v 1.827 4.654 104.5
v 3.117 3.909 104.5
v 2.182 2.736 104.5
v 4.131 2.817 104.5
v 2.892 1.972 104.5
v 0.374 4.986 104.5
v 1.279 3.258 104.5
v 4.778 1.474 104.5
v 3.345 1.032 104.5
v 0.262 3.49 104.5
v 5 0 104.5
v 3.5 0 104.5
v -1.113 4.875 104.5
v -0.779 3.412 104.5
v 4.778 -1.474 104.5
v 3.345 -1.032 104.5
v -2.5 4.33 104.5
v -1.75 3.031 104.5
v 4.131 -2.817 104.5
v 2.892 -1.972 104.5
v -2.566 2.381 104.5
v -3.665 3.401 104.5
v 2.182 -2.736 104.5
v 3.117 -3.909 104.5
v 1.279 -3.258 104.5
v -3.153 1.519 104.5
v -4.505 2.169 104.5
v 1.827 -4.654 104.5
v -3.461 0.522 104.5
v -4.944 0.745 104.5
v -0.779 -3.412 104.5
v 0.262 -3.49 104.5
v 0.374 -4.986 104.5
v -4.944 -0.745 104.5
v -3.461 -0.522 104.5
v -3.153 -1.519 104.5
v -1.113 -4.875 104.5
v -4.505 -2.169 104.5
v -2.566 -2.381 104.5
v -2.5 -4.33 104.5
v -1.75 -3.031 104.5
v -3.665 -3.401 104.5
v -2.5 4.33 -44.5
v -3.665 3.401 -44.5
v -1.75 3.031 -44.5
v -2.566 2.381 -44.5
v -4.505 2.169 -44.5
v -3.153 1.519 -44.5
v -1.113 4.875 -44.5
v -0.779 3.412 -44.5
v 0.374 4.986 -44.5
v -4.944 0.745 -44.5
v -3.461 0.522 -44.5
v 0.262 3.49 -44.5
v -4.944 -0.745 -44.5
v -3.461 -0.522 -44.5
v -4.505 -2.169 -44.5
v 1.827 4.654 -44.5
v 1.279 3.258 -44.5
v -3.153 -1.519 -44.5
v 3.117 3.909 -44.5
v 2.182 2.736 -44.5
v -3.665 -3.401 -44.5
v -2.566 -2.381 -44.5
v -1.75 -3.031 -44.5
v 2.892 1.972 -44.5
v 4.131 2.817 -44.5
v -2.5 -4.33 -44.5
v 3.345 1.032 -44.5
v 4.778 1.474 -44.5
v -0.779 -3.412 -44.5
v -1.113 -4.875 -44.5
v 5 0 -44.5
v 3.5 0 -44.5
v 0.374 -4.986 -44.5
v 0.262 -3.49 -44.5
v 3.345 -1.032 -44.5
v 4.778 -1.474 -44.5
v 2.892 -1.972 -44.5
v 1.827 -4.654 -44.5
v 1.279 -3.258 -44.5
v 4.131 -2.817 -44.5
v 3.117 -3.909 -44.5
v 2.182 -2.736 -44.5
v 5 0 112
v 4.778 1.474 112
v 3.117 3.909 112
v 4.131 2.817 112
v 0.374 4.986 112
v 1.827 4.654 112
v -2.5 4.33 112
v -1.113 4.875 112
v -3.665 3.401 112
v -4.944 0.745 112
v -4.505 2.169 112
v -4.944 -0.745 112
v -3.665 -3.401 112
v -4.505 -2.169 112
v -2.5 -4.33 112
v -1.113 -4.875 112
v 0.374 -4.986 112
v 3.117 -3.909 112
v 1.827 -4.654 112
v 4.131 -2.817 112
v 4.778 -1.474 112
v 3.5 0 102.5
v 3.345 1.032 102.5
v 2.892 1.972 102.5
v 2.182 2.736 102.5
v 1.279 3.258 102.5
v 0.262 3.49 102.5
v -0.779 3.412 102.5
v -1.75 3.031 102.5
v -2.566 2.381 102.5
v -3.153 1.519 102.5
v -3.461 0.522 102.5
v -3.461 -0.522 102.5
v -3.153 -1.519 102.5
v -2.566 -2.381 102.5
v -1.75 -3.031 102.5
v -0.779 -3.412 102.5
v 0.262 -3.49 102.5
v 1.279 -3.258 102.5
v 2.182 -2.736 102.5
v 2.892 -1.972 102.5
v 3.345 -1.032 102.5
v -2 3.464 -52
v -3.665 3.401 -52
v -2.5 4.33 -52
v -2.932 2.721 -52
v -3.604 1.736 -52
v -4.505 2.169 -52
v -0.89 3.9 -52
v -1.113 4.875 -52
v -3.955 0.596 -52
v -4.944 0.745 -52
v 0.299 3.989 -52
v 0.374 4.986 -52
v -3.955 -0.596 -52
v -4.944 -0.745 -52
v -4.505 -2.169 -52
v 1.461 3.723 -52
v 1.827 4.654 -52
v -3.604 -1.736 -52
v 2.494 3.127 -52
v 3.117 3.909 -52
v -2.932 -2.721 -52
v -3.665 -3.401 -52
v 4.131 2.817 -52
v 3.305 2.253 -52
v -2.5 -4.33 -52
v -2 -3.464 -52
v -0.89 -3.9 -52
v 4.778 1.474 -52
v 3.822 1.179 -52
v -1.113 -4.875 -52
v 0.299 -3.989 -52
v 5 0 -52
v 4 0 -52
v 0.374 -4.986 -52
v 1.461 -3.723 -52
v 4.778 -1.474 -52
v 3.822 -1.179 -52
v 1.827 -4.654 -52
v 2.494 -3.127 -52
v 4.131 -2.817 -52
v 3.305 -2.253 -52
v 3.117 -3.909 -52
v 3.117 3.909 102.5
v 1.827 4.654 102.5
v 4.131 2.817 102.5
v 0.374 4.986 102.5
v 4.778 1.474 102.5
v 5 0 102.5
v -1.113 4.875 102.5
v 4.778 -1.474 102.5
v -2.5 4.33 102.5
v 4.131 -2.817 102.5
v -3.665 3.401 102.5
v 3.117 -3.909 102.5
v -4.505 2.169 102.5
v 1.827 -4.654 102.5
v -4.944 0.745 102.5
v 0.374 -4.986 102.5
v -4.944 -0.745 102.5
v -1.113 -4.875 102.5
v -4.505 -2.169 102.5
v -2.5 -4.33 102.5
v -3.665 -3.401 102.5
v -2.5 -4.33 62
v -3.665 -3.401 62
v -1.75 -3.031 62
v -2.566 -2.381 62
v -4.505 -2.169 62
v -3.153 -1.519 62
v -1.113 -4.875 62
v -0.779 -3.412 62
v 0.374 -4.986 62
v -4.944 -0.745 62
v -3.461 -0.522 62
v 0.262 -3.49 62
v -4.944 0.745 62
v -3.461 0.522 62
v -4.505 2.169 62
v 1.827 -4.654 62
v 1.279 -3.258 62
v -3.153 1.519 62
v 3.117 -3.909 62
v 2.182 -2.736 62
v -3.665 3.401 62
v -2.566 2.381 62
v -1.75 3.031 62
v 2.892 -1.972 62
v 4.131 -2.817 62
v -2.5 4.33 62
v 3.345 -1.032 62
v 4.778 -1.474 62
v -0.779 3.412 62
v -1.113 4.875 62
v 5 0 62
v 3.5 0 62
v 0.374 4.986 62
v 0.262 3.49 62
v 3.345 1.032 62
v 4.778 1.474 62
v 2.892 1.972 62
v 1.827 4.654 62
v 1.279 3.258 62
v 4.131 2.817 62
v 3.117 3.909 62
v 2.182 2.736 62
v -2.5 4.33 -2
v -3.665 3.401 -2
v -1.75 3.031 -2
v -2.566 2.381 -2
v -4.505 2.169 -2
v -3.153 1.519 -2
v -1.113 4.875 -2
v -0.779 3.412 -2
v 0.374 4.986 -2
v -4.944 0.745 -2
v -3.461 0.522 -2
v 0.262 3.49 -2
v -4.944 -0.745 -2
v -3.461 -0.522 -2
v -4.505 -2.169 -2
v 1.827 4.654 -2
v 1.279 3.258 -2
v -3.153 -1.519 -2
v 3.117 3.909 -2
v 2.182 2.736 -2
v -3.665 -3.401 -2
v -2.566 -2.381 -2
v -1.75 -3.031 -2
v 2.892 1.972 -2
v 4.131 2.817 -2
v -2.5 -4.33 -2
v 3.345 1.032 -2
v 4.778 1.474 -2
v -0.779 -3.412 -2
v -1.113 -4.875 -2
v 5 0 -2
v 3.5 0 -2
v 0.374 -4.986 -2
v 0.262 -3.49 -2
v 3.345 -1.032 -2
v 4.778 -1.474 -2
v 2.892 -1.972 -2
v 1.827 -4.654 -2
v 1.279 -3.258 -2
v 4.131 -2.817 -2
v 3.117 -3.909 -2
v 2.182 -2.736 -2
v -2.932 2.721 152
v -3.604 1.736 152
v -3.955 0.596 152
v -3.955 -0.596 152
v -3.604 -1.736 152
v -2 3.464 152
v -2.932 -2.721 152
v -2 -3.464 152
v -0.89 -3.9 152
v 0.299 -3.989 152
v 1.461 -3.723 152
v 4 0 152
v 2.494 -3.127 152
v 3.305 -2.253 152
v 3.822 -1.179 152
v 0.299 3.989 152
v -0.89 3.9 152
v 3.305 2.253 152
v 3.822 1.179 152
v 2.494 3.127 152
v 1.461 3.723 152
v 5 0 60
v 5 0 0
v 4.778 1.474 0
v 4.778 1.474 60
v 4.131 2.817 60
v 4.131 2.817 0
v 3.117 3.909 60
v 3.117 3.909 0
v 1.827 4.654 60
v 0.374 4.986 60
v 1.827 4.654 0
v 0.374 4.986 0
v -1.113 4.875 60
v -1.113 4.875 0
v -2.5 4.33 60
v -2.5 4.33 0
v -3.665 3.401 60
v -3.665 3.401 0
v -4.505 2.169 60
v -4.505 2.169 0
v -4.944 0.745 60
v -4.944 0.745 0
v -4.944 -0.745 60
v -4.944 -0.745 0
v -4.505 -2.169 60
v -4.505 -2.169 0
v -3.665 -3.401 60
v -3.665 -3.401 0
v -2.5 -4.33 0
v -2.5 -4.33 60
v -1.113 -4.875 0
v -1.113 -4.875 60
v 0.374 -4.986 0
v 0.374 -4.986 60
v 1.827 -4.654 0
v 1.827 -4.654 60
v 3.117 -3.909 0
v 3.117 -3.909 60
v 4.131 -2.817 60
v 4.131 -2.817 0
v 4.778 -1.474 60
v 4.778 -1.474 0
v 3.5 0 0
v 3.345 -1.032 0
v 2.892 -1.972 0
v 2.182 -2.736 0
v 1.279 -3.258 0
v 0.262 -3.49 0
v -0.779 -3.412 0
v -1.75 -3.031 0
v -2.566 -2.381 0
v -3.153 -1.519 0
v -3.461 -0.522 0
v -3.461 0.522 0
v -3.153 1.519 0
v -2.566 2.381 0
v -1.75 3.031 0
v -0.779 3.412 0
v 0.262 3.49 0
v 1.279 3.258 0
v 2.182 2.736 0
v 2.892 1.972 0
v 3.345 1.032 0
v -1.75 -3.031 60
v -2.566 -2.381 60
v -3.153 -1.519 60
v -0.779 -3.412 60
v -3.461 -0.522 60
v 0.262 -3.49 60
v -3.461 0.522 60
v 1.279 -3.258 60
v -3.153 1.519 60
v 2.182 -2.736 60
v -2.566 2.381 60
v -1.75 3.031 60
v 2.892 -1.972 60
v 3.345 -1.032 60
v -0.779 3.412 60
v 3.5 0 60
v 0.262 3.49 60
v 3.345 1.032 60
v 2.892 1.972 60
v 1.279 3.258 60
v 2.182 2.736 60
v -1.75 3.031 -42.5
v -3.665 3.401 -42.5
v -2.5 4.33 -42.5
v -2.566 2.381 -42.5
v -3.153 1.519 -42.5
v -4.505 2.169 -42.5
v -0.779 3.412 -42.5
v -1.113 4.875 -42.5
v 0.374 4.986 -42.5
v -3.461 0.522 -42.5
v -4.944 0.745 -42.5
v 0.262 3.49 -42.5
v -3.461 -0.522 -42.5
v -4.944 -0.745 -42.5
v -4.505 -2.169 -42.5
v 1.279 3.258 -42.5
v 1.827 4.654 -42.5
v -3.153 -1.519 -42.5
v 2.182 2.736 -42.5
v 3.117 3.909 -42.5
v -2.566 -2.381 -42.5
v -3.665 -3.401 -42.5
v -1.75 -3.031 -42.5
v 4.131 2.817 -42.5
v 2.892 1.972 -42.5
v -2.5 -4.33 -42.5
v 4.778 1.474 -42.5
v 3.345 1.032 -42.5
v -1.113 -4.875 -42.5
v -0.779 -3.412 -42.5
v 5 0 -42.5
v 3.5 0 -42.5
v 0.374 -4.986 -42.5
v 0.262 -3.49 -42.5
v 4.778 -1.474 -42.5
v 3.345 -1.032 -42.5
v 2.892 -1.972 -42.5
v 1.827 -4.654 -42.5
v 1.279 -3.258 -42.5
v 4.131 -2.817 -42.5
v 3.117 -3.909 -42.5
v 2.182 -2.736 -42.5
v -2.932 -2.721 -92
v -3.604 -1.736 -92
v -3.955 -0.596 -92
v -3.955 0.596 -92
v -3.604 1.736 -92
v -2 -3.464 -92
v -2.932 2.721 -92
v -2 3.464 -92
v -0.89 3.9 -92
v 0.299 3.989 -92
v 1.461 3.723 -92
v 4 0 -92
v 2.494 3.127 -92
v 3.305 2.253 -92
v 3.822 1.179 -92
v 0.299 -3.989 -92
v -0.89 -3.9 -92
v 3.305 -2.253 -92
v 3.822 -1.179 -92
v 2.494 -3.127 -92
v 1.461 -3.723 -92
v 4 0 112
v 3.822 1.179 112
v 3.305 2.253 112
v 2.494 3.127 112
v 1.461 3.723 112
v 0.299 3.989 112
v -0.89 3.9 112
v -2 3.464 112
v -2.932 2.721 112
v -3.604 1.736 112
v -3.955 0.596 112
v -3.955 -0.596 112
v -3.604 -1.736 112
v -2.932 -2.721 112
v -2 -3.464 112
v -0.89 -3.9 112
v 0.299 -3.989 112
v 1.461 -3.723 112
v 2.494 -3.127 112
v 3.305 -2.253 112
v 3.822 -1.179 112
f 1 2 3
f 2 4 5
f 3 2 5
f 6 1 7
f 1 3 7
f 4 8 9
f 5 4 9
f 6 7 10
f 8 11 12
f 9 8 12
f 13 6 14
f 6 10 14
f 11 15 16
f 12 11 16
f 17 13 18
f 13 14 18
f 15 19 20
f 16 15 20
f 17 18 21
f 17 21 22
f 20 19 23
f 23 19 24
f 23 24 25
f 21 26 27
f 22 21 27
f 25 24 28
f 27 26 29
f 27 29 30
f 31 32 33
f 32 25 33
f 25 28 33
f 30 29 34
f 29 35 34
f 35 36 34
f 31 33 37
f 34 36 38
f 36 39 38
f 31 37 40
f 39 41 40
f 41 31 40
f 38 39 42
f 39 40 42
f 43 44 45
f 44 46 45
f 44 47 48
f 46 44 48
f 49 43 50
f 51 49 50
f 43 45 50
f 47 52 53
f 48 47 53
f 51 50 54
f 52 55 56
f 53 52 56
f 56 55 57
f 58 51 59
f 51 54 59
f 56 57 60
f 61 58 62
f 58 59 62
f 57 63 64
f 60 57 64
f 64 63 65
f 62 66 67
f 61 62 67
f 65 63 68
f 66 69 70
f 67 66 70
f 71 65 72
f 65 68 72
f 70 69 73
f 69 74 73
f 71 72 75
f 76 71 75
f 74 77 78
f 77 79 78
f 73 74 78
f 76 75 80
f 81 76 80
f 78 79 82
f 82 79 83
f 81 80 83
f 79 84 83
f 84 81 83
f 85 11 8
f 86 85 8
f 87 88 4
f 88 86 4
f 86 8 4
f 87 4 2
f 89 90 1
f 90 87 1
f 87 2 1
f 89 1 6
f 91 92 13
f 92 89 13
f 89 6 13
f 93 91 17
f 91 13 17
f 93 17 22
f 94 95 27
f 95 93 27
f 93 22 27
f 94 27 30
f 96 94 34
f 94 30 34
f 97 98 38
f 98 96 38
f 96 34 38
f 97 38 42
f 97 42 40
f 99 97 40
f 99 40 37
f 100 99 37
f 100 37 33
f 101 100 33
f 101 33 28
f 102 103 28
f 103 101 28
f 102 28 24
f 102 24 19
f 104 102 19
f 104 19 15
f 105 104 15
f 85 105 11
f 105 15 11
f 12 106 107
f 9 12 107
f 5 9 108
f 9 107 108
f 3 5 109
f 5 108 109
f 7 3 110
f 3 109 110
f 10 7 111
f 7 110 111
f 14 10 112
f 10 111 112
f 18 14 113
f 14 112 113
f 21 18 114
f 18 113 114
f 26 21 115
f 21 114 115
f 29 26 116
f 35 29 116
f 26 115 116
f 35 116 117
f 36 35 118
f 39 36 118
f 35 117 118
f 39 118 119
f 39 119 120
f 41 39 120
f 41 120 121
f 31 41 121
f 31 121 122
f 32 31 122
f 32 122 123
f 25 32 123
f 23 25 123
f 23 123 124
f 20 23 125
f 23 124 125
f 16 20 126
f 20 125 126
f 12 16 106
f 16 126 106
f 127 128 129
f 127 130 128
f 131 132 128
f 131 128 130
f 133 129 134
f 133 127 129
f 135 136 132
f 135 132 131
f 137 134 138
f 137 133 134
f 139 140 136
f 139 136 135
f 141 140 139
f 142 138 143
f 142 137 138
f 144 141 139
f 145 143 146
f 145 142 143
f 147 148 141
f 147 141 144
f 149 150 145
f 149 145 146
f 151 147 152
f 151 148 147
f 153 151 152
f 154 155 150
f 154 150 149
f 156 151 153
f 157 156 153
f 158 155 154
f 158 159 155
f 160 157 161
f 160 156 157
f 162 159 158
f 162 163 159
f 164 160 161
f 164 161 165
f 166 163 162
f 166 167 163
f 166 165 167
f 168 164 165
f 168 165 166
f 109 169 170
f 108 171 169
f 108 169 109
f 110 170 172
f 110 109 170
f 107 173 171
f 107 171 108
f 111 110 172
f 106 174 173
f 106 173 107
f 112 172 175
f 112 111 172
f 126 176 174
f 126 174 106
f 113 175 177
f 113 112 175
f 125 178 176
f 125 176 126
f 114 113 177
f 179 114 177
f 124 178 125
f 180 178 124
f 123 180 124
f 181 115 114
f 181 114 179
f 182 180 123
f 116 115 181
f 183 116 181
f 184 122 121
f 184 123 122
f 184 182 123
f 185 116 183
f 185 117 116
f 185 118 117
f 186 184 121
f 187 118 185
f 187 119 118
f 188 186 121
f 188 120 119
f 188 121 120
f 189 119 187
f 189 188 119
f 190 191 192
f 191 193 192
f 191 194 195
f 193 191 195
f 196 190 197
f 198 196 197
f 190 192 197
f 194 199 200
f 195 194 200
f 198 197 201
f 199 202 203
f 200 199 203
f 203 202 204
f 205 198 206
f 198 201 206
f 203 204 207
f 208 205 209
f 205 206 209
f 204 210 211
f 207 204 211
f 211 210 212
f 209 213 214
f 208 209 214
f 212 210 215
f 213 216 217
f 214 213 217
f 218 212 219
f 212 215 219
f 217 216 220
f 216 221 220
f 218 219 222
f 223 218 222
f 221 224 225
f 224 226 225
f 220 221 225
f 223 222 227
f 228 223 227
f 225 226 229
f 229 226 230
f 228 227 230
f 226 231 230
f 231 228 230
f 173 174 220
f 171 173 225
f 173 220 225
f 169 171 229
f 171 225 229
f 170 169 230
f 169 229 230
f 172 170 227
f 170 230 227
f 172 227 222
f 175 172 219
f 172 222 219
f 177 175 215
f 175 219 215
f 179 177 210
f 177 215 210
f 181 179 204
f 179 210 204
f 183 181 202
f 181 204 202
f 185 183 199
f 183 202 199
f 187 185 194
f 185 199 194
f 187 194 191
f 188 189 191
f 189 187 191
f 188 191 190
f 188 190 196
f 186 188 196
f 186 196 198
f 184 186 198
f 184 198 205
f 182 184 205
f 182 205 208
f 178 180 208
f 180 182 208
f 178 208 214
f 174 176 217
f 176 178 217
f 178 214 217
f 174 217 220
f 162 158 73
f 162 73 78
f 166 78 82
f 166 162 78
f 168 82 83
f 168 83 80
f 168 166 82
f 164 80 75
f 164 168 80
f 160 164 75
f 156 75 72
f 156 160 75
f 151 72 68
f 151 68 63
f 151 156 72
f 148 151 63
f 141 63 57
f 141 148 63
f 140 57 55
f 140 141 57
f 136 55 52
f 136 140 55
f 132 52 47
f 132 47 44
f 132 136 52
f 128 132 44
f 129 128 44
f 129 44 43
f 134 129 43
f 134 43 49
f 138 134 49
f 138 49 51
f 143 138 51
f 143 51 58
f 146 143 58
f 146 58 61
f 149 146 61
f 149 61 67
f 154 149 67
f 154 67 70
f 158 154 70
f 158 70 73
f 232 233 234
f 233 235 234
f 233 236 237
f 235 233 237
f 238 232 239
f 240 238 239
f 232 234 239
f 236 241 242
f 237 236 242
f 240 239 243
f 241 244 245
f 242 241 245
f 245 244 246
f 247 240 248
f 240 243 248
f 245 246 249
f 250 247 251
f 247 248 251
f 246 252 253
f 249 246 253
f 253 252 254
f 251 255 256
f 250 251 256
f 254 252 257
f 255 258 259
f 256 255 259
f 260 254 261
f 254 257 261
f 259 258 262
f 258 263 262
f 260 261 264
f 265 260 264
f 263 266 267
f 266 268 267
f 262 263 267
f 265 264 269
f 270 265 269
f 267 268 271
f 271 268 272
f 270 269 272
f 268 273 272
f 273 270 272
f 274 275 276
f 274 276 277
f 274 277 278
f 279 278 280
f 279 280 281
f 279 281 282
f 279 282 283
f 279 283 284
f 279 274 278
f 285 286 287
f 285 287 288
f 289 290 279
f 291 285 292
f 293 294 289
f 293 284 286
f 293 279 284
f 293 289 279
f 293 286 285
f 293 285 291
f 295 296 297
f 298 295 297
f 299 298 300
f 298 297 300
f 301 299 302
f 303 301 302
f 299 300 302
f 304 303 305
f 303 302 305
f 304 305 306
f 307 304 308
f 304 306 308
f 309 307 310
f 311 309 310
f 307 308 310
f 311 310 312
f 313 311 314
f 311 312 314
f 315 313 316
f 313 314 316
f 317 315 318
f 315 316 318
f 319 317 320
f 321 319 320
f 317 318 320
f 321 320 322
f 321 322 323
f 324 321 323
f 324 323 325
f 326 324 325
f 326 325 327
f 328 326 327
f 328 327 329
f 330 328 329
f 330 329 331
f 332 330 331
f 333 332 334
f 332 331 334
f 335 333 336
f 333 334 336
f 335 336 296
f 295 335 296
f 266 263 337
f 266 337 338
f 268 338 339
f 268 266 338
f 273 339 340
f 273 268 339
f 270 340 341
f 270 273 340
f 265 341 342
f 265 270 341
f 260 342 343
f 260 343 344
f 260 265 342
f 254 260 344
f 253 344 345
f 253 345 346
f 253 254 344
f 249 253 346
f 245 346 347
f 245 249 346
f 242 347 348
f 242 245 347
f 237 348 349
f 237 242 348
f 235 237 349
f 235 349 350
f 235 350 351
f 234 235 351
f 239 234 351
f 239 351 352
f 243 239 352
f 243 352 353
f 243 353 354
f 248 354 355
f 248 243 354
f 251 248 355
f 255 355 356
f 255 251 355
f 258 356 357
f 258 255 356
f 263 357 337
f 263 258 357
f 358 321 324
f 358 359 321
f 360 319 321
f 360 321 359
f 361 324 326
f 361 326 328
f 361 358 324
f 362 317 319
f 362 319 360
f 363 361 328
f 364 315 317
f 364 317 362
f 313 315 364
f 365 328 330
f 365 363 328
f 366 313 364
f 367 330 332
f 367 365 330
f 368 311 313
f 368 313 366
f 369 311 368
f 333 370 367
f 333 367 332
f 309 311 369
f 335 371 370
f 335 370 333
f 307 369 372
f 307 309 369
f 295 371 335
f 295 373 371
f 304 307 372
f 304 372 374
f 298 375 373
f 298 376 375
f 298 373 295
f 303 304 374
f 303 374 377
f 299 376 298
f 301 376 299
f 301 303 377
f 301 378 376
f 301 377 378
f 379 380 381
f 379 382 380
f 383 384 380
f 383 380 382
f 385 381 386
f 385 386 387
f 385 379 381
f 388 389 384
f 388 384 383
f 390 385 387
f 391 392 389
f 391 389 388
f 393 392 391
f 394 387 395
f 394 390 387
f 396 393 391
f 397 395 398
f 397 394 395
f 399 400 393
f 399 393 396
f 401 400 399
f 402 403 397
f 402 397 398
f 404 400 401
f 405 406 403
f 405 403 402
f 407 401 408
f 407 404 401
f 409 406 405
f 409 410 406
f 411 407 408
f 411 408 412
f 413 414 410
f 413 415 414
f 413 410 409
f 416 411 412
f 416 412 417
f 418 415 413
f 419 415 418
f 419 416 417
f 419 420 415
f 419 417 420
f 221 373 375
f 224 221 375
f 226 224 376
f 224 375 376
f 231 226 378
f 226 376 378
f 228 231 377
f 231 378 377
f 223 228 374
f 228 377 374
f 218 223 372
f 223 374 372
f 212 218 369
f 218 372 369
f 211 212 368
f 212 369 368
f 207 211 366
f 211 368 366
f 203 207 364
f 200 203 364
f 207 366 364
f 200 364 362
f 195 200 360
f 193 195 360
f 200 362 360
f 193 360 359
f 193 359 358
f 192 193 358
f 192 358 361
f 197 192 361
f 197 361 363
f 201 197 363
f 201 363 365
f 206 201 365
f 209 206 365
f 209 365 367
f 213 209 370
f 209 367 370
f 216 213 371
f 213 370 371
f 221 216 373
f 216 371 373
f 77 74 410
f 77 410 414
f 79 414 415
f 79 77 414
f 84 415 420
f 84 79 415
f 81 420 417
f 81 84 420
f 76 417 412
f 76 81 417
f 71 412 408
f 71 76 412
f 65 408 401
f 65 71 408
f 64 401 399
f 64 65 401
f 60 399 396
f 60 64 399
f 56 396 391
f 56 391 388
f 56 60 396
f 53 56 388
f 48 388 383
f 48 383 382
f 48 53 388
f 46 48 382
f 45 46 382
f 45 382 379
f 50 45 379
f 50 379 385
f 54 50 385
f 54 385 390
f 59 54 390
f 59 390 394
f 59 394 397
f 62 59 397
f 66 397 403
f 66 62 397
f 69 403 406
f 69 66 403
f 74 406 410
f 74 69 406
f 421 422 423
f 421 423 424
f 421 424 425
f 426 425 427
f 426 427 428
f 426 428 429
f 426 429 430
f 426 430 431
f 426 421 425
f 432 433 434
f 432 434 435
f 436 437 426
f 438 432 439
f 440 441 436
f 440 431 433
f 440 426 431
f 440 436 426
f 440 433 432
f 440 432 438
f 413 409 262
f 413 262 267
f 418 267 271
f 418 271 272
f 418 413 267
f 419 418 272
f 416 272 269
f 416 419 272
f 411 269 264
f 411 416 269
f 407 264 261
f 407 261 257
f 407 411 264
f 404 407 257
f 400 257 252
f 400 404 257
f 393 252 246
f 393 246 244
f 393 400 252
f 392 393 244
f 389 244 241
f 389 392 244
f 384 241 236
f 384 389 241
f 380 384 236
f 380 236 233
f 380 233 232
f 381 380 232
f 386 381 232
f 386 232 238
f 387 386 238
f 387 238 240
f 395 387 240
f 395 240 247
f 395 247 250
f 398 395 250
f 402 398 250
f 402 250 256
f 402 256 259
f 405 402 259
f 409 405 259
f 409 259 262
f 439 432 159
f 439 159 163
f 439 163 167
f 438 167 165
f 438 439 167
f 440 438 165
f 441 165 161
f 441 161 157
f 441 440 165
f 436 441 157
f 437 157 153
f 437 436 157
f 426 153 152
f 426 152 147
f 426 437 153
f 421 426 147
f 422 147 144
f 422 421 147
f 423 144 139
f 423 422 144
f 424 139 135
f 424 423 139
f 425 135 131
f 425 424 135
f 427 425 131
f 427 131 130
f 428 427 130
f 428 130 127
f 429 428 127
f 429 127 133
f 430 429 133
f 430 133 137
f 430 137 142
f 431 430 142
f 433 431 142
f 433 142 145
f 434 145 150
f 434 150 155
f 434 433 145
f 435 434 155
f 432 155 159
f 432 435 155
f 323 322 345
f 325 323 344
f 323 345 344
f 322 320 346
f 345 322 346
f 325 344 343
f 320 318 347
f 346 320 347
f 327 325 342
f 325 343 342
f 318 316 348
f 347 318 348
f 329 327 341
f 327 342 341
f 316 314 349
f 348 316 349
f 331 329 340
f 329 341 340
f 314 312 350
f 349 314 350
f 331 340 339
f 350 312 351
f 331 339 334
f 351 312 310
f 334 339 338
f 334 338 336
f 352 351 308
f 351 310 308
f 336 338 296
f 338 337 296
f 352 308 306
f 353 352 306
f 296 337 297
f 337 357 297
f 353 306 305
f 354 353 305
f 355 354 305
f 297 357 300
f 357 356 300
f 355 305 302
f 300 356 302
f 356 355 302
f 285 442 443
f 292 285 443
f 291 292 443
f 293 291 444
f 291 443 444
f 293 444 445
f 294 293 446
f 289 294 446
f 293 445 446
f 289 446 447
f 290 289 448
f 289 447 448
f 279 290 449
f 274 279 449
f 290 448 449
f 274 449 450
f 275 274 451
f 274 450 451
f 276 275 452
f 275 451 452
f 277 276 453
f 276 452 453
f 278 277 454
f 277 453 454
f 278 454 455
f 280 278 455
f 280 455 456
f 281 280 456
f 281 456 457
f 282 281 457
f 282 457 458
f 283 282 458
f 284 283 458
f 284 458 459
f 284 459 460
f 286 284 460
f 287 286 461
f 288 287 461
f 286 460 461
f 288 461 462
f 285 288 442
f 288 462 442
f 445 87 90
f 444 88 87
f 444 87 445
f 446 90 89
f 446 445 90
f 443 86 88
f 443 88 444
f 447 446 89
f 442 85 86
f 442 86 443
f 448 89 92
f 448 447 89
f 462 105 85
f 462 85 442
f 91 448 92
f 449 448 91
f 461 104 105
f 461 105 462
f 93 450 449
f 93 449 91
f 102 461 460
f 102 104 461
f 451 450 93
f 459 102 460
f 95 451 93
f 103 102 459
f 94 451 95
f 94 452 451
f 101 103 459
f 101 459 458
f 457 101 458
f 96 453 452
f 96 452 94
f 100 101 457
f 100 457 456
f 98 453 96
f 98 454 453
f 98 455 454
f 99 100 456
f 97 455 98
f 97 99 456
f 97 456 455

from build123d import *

# Parameters (mm, degrees)
SKETCH_1_R          = 5
EXTRUDE_1_DEPTH     = 60
SKETCH_2_R          = 3.5
EXTRUDE_2_DEPTH     = 2
EXTRUDE_START       = 2
SKETCH_3_R          = 3.5
EXTRUDE_3_DEPTH     = 2
EXTRUDE_START_2     = 90
SKETCH_4_R          = 5
EXTRUDE_4_DEPTH     = 90
SKETCH_5_R          = 5
EXTRUDE_5_DEPTH     = 90
CUT_EXTRUDE_START   = -40
SKETCH_6_R          = 5
SKETCH_6_R_2        = 4
CUT_EXTRUDE_2_DEPTH = 40
SKETCH_7_R          = 5
SKETCH_7_R_2        = 4
CUT_EXTRUDE_3_DEPTH = 40
CUT_EXTRUDE_START_2 = 2
SKETCH_8_R          = 5
SKETCH_8_R_2        = 3.5
CUT_EXTRUDE_4_DEPTH = 2
SKETCH_9_R          = 5
SKETCH_9_R_2        = 3.5
CUT_EXTRUDE_5_DEPTH = 2


with BuildPart() as part:
    # 草图1 → 凸台-拉伸1 (new body)
    with BuildSketch(Plane.XY):
        Circle(SKETCH_1_R)
    extrude(amount=EXTRUDE_1_DEPTH)

    # 草图2 → 凸台-拉伸2 (add)
    with BuildSketch(Plane.XY.offset(60)):
        Circle(SKETCH_2_R)
    extrude(amount=EXTRUDE_2_DEPTH)

    # 草图3 → 凸台-拉伸3 (add)
    with BuildSketch(Plane(origin=(0, 0, 0), x_dir=(-1, 0, 0), z_dir=(0, 0, -1)).offset(EXTRUDE_START)):
        with Locations(Location((0, 0, 0), (0, 0, 180))):
            Circle(SKETCH_3_R)
    extrude(amount=-EXTRUDE_3_DEPTH)

    # 草图4 → 凸台-拉伸4 (add)
    with BuildSketch(Plane(origin=(0, 0, -2), x_dir=(-1, 0, 0), z_dir=(0, 0, -1)).offset(EXTRUDE_START_2)):
        with Locations(Location((0, 0, 0), (0, 0, 180))):
            Circle(SKETCH_4_R)
    extrude(amount=-EXTRUDE_4_DEPTH)

    # 草图5 → 凸台-拉伸5 (add)
    with BuildSketch(Plane.XY.offset(62)):
        Circle(SKETCH_5_R)
    extrude(amount=EXTRUDE_5_DEPTH)

    # 草图6 → 切除-拉伸2 (cut)
    with BuildSketch(Plane.XY.offset(152).offset(CUT_EXTRUDE_START)):
        with Locations(Location((0, 0, 0), (0, 0, 180))):
            Circle(SKETCH_6_R)
        Circle(SKETCH_6_R_2, mode=Mode.SUBTRACT)
    extrude(amount=CUT_EXTRUDE_2_DEPTH, mode=Mode.SUBTRACT)

    # 草图7 → 切除-拉伸3 (cut)
    with BuildSketch(Plane(origin=(0, 0, -92), x_dir=(-1, 0, 0), z_dir=(0, 0, -1))):
        with Locations(Location((0, 0, 0), (0, 0, 180))):
            Circle(SKETCH_7_R)
        with Locations(Location((0, 0, 0), (0, 0, 180))):
            Circle(SKETCH_7_R_2, mode=Mode.SUBTRACT)
    extrude(amount=-CUT_EXTRUDE_3_DEPTH, mode=Mode.SUBTRACT)

    # 草图8 → 切除-拉伸4 (cut)
    with BuildSketch(Plane(origin=(0, 0, -42.5), x_dir=(-1, 0, 0), z_dir=(0, 0, -1)).offset(CUT_EXTRUDE_START_2)):
        with Locations(Location((0, 0, 0), (0, 0, 180))):
            Circle(SKETCH_8_R)
        with Locations(Location((0, 0, 0), (0, 0, 180))):
            Circle(SKETCH_8_R_2, mode=Mode.SUBTRACT)
    extrude(amount=-CUT_EXTRUDE_4_DEPTH, mode=Mode.SUBTRACT)

    # 草图9 → 切除-拉伸5 (cut)
    with BuildSketch(Plane.XY.offset(102.5)):
        with Locations(Location((0, 0, 0), (0, 0, 180))):
            Circle(SKETCH_9_R)
        Circle(SKETCH_9_R_2, mode=Mode.SUBTRACT)
    extrude(amount=CUT_EXTRUDE_5_DEPTH, mode=Mode.SUBTRACT)


solid = part.part
